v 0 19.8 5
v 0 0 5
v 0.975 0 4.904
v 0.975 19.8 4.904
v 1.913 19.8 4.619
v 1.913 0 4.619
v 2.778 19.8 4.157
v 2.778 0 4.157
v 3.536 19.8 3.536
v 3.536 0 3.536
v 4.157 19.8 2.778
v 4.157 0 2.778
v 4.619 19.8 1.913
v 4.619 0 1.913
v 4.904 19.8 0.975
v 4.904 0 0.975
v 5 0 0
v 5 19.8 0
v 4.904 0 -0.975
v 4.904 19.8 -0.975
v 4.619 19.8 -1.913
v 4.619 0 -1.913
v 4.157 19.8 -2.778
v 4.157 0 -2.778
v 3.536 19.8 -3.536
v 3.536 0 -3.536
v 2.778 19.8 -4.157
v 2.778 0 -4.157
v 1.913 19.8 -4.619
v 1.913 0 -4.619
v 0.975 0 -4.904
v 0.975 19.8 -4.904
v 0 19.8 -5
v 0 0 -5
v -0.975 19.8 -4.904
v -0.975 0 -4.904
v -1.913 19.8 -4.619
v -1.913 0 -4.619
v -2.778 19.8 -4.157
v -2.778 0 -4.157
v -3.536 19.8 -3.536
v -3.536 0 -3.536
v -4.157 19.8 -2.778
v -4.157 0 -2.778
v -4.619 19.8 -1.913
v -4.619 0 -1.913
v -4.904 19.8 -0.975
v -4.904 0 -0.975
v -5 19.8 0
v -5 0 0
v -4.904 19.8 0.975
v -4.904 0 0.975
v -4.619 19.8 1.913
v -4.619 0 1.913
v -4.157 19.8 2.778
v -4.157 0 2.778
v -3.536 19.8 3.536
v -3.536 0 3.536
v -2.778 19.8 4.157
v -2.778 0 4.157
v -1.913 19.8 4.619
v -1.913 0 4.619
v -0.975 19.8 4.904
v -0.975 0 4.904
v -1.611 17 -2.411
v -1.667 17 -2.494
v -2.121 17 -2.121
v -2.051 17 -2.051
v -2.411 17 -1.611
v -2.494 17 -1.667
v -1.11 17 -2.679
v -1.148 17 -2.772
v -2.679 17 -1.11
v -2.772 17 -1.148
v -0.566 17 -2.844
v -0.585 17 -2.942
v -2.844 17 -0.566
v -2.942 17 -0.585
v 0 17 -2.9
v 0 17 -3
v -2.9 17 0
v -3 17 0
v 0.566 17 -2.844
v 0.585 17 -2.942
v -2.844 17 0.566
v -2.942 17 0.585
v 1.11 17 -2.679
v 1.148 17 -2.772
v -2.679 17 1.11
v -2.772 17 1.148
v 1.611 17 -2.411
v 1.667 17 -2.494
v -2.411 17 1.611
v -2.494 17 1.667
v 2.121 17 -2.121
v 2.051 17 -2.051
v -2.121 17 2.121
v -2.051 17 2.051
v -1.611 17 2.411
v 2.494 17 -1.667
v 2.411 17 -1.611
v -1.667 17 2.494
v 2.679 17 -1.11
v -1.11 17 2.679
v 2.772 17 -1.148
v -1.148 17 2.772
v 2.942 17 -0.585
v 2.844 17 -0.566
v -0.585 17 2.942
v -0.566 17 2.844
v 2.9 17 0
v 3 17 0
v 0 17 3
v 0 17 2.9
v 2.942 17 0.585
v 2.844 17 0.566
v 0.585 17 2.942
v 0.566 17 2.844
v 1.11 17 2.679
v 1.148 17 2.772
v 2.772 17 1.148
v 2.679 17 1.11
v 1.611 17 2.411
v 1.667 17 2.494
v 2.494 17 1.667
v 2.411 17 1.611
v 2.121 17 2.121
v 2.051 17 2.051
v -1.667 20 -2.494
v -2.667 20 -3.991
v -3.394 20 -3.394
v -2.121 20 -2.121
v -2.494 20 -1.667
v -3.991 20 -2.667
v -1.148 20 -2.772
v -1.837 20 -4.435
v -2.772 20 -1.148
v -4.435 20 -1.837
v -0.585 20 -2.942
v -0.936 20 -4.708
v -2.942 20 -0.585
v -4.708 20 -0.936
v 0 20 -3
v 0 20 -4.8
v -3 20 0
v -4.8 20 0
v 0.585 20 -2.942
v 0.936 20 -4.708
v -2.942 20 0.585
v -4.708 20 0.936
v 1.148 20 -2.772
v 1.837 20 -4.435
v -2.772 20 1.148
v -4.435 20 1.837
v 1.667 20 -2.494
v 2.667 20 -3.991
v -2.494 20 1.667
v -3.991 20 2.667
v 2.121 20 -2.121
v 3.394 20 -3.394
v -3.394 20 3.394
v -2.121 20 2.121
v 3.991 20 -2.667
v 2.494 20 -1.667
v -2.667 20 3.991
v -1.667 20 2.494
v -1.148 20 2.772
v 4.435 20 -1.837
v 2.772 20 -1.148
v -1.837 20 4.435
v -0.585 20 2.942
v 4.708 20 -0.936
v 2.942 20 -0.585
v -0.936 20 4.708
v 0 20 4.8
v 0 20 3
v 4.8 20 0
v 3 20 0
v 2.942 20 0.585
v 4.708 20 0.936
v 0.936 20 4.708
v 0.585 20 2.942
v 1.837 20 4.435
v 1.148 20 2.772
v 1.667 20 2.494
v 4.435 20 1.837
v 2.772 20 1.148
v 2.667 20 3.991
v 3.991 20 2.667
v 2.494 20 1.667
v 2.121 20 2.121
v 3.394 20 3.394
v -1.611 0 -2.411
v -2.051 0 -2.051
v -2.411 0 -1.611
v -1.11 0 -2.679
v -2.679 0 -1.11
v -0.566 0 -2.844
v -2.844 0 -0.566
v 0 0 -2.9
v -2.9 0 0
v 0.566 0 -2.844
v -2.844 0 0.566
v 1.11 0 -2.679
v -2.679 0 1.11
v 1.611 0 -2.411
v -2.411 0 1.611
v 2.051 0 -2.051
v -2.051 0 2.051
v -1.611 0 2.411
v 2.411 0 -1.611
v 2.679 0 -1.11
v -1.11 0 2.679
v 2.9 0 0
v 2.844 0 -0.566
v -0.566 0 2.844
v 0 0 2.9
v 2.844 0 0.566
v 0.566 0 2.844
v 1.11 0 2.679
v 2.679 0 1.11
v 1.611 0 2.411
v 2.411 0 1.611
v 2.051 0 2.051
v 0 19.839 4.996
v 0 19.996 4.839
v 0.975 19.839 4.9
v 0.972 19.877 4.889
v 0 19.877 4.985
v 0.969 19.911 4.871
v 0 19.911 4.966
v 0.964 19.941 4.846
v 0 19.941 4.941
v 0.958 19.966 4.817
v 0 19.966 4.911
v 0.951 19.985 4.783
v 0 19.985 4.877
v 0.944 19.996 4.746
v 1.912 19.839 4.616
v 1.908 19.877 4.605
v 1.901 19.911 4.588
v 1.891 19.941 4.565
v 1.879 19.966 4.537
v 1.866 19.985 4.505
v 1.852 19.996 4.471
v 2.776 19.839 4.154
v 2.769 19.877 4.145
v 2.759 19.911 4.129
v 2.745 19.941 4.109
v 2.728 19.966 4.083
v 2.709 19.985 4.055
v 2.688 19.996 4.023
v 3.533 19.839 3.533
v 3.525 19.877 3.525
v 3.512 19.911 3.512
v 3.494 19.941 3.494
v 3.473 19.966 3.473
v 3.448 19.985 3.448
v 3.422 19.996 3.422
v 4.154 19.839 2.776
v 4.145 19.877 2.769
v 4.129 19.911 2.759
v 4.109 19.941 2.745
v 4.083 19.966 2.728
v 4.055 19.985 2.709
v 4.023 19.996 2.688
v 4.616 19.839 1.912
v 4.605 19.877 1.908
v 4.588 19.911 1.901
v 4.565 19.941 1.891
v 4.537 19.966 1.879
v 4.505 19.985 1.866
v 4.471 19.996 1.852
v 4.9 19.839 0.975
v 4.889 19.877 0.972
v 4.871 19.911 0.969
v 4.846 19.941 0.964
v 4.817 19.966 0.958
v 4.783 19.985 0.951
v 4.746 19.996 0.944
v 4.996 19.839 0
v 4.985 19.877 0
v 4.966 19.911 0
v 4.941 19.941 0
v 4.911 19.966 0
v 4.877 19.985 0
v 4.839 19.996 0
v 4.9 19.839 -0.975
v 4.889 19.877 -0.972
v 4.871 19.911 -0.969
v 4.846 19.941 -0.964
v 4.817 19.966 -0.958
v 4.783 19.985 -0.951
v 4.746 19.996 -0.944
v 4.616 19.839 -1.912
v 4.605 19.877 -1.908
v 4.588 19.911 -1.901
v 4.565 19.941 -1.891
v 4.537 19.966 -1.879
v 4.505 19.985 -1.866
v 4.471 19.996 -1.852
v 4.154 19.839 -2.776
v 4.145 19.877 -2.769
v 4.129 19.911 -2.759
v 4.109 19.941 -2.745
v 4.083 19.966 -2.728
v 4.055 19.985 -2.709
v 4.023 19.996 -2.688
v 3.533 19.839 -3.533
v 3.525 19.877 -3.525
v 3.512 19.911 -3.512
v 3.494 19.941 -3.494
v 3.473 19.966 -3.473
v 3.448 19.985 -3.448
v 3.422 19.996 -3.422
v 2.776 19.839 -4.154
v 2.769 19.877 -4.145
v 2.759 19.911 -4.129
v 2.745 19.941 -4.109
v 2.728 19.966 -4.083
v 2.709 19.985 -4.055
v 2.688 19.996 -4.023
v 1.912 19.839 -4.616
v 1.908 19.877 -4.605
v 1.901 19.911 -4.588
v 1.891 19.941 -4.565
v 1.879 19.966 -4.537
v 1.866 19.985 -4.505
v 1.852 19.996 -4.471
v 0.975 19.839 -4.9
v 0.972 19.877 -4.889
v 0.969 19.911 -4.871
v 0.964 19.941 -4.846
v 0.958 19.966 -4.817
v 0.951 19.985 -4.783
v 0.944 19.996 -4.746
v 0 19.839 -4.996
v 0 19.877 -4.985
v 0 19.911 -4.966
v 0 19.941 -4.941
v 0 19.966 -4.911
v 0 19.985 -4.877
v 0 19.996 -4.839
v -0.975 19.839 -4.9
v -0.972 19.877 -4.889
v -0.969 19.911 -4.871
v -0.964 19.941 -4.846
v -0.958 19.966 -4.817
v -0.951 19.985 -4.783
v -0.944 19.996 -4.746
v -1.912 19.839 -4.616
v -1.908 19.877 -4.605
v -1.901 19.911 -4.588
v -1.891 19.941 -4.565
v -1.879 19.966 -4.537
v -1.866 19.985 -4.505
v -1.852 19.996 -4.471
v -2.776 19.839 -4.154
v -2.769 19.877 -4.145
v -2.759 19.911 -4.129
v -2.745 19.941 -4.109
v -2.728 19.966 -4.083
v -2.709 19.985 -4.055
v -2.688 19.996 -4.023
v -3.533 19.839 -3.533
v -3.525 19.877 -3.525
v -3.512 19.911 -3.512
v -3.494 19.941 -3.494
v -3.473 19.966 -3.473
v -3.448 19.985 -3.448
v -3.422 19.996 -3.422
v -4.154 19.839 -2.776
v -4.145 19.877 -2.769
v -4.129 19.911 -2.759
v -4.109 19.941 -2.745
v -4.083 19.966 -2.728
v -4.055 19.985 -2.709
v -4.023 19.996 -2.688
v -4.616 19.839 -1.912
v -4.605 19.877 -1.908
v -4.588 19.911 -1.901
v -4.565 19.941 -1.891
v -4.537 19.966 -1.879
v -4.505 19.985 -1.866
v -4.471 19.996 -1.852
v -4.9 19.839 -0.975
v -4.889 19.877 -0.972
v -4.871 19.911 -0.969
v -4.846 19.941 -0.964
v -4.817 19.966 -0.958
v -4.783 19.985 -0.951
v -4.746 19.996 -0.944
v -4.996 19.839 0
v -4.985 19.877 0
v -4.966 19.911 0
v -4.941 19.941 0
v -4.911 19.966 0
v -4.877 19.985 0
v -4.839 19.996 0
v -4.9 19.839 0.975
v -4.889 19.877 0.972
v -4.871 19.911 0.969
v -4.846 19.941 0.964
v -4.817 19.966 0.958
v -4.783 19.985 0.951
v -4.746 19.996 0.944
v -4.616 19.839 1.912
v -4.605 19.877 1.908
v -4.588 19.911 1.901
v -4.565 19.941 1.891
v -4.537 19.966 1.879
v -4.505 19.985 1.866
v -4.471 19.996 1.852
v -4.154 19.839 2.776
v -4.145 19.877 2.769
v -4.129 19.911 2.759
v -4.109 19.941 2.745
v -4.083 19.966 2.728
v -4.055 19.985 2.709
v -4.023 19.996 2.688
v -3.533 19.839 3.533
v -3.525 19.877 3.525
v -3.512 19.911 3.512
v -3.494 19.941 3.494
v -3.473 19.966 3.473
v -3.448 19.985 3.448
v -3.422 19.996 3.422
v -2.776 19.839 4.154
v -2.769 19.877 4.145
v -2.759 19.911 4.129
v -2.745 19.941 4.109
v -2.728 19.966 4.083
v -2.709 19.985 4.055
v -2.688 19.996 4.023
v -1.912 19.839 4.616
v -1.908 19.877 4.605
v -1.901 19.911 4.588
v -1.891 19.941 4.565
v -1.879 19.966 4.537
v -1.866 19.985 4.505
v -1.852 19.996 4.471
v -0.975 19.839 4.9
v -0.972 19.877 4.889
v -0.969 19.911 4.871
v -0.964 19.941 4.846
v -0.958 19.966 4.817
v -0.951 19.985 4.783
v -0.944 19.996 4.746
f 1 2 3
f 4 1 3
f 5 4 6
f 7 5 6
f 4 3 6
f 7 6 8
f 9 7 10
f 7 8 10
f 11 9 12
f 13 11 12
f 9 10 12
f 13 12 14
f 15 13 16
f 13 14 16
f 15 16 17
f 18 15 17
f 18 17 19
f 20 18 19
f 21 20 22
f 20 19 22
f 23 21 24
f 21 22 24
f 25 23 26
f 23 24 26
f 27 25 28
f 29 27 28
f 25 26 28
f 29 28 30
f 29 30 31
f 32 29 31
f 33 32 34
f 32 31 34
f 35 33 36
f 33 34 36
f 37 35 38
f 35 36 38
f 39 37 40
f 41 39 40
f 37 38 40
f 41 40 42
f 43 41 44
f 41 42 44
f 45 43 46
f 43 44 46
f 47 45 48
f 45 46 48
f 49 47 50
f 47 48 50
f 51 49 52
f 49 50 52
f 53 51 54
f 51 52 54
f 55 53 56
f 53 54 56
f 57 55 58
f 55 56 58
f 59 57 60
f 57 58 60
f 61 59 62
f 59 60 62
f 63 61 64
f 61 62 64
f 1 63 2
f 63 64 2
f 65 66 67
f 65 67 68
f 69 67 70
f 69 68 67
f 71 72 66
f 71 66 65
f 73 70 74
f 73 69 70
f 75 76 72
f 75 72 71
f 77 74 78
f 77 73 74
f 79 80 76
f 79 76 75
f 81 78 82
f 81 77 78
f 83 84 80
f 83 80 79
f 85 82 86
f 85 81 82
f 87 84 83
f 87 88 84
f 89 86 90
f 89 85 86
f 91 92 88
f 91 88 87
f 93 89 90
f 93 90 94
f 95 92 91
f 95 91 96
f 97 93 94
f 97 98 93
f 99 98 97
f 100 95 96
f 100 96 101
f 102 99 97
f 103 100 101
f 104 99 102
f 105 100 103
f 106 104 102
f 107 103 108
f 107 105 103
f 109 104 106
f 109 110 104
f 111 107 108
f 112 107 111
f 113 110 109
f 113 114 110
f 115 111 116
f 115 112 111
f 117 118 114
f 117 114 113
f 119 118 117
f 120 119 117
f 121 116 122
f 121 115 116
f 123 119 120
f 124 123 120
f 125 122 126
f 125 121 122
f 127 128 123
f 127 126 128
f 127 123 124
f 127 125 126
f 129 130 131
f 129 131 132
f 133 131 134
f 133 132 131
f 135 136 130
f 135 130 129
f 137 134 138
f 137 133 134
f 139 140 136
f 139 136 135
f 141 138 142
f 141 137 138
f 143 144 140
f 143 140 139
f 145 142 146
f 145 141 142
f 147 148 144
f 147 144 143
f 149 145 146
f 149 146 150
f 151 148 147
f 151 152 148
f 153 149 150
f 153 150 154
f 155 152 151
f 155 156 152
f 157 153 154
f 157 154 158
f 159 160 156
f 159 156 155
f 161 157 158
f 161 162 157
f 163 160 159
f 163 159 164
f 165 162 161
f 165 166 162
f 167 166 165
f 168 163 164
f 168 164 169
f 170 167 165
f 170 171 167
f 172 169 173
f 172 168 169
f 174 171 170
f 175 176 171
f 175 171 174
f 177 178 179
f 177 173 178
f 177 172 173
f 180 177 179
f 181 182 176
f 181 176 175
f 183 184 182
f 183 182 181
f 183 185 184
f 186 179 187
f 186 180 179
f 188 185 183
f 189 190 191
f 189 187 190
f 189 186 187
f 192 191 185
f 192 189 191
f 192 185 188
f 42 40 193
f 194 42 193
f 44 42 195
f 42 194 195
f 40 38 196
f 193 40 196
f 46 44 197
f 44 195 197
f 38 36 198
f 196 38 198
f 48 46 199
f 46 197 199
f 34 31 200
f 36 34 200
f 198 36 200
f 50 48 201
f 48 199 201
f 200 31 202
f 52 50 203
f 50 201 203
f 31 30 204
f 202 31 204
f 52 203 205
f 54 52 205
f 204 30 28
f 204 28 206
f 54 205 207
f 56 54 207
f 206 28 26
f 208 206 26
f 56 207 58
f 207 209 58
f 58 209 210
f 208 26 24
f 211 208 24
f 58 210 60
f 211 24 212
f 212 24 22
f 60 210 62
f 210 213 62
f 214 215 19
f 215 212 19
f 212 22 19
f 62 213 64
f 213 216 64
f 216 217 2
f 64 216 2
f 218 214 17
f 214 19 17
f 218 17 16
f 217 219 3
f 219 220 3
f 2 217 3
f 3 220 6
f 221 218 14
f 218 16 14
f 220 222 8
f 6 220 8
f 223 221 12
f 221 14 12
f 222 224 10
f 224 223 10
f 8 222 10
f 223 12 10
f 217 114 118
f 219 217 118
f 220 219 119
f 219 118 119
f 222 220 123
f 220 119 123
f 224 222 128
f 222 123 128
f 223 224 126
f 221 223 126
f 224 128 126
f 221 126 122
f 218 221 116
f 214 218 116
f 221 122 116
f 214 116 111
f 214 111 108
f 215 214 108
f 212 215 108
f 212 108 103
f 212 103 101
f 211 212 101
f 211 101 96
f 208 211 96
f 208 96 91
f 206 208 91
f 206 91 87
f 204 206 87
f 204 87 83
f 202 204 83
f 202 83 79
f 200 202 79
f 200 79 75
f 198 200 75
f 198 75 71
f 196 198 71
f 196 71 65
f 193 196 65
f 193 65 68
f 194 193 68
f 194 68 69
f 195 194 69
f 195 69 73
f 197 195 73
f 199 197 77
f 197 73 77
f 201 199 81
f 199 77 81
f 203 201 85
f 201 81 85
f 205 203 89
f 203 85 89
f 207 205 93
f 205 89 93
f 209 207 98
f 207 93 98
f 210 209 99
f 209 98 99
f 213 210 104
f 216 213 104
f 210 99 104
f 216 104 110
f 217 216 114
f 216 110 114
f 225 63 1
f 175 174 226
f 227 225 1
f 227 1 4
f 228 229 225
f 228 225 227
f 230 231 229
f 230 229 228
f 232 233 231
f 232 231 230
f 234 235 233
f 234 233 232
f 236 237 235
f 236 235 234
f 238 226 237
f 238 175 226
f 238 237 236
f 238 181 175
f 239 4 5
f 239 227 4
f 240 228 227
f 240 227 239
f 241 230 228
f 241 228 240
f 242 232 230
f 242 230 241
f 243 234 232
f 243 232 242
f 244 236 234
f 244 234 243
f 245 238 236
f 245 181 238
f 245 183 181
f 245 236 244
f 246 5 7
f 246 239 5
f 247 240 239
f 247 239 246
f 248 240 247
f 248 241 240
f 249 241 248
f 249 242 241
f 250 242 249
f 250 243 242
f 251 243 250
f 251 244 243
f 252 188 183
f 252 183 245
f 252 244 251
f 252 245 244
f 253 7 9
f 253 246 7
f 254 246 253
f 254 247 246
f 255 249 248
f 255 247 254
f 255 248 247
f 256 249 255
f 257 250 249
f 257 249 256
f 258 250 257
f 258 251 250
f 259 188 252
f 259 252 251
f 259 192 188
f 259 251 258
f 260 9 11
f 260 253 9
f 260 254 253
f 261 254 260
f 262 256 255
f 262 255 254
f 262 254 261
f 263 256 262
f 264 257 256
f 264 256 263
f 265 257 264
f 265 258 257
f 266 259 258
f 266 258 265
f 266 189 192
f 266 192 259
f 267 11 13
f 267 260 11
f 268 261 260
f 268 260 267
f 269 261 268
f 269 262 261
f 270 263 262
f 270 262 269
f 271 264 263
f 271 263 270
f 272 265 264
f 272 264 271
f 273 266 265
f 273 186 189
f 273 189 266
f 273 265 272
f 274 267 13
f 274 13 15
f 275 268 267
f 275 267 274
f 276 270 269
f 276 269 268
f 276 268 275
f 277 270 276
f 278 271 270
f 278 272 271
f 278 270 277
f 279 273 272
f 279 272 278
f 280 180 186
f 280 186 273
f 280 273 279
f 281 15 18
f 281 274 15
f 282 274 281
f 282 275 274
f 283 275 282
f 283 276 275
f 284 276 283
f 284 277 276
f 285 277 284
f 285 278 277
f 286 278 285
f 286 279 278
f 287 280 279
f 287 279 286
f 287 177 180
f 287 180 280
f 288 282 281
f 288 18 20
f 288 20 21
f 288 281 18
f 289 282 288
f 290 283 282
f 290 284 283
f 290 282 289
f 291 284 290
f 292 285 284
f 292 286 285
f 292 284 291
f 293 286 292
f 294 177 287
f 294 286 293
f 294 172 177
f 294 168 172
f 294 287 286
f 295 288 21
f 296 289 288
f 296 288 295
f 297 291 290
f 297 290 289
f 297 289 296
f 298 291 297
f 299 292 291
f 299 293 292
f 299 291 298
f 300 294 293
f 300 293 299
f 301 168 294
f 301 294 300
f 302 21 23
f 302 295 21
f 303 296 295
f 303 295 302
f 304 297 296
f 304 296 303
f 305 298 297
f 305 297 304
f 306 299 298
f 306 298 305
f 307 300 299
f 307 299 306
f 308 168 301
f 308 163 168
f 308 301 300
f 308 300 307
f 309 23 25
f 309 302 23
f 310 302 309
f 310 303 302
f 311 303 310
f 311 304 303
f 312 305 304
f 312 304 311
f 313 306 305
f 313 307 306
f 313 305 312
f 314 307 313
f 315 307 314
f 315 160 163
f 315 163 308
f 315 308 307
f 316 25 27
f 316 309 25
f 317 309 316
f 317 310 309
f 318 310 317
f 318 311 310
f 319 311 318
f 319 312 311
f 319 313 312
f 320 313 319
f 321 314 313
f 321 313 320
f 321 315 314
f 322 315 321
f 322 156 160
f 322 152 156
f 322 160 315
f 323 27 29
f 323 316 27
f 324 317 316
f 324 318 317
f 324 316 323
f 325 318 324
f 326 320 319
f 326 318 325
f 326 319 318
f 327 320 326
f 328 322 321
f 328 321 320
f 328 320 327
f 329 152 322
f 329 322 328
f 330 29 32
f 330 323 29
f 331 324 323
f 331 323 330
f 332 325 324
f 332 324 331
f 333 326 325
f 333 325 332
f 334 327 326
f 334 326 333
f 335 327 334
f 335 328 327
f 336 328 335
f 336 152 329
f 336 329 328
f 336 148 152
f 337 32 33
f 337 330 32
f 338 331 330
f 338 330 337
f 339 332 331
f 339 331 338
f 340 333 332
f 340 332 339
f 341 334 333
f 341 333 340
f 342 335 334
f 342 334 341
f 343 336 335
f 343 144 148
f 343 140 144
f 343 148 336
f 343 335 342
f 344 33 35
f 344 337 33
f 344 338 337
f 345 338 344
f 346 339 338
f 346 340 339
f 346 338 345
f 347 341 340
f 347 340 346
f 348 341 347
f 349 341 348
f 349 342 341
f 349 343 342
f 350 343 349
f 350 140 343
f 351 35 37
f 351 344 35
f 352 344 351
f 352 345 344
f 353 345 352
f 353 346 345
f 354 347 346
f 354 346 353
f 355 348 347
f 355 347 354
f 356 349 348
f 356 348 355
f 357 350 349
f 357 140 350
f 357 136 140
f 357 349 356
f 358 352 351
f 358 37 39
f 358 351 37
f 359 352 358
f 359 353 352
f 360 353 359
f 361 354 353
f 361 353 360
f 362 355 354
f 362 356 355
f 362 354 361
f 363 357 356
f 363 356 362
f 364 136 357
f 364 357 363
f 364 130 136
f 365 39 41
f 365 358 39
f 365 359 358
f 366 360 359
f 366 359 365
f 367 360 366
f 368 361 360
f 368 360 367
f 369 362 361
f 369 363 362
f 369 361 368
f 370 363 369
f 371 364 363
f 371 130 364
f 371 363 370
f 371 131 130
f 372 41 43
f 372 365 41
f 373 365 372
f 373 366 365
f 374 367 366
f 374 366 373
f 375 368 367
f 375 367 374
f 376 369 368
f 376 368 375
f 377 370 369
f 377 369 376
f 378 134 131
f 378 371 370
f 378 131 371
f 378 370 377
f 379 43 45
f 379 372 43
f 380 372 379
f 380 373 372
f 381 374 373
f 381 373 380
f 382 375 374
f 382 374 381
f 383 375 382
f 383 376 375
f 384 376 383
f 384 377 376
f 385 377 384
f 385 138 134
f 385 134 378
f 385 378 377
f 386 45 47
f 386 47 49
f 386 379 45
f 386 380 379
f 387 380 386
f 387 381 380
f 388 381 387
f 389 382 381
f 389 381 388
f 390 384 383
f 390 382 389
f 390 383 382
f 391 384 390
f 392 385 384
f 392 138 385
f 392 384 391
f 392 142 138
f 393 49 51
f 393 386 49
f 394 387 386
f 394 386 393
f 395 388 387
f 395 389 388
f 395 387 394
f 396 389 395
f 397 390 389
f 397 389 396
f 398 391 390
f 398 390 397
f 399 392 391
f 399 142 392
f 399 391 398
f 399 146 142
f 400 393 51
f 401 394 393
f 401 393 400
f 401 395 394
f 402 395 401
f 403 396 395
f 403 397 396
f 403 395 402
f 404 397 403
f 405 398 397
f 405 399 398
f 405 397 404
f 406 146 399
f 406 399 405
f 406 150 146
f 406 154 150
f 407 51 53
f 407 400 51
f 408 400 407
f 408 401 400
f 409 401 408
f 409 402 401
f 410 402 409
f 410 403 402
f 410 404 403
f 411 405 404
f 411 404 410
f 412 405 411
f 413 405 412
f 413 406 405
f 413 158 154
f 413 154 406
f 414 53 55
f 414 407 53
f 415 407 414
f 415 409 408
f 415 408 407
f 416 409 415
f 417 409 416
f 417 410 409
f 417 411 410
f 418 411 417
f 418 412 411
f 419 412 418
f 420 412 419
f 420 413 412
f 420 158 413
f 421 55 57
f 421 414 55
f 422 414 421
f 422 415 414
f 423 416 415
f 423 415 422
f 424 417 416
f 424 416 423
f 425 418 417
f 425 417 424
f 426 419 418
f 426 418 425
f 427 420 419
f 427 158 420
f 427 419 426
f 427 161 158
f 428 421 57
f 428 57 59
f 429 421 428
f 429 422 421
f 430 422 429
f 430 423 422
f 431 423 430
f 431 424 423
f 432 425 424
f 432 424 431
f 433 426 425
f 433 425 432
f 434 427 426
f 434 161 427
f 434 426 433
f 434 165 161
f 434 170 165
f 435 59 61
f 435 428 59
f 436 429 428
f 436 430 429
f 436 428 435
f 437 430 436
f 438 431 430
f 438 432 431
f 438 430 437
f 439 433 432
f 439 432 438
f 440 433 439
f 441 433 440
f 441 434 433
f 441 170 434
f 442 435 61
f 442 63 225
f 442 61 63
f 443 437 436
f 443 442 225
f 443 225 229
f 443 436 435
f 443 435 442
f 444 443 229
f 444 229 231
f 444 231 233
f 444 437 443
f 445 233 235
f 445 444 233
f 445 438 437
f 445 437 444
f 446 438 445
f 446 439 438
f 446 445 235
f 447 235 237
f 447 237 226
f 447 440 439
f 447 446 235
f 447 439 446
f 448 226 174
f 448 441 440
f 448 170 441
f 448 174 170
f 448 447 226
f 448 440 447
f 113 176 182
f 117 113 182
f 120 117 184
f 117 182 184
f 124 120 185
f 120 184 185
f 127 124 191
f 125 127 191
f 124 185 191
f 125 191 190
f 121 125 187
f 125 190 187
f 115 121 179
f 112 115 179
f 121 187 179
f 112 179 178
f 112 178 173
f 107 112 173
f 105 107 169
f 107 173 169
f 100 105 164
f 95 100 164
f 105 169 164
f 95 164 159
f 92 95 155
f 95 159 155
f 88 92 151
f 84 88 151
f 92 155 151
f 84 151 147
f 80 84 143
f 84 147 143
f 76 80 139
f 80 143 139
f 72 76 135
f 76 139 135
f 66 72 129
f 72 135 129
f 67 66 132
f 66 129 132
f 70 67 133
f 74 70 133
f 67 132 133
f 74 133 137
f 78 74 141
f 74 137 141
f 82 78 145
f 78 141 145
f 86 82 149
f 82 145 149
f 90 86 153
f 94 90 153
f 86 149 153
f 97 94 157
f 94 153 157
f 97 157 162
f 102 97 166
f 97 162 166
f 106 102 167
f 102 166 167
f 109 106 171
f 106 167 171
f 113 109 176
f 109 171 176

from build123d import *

# Parameters (mm, degrees)
SKIZZE1_R                       = 5
AUFSATZ_LINEAR_AUSTRAGEN1_DEPTH = 20
SKIZZE2_R                       = 2.9
SCHNITT_LINEAR_AUSTRAGEN1_DEPTH = 20
SKIZZE3_R                       = 3
SCHNITT_LINEAR_AUSTRAGEN2_DEPTH = 3
VERRUNDUNG1_R                   = 0.2


with BuildPart() as part:
    # Skizze1 → Aufsatz-Linear austragen1 (new body)
    with BuildSketch(Plane(origin=(0, 0, 0), x_dir=(1, 0, 0), z_dir=(0, 1, 0))):
        with Locations(Location((0, 0, 0), (0, 0, 270))):
            Circle(SKIZZE1_R)
    extrude(amount=AUFSATZ_LINEAR_AUSTRAGEN1_DEPTH)

    # Skizze2 → Schnitt-Linear austragen1 (cut)
    with BuildSketch(Plane(origin=(0, 20, 0), x_dir=(1, 0, 0), z_dir=(0, 1, 0))):
        with Locations(Location((0, 0, 0), (0, 0, 270))):
            Circle(SKIZZE2_R)
    extrude(amount=-SCHNITT_LINEAR_AUSTRAGEN1_DEPTH, mode=Mode.SUBTRACT)

    # Skizze3 → Schnitt-Linear austragen2 (cut)
    with BuildSketch(Plane(origin=(0, 20, 0), x_dir=(1, 0, 0), z_dir=(0, 1, 0))):
        with Locations(Location((0, 0, 0), (0, 0, 270))):
            Circle(SKIZZE3_R)
    extrude(amount=-SCHNITT_LINEAR_AUSTRAGEN2_DEPTH, mode=Mode.SUBTRACT)

    # Verrundung1
    verrundung1_edges = [part.edges().sort_by_distance(p)[0] for p in [
        (0, 20, -5),
    ]]
    fillet(verrundung1_edges, radius=VERRUNDUNG1_R)


solid = part.part
